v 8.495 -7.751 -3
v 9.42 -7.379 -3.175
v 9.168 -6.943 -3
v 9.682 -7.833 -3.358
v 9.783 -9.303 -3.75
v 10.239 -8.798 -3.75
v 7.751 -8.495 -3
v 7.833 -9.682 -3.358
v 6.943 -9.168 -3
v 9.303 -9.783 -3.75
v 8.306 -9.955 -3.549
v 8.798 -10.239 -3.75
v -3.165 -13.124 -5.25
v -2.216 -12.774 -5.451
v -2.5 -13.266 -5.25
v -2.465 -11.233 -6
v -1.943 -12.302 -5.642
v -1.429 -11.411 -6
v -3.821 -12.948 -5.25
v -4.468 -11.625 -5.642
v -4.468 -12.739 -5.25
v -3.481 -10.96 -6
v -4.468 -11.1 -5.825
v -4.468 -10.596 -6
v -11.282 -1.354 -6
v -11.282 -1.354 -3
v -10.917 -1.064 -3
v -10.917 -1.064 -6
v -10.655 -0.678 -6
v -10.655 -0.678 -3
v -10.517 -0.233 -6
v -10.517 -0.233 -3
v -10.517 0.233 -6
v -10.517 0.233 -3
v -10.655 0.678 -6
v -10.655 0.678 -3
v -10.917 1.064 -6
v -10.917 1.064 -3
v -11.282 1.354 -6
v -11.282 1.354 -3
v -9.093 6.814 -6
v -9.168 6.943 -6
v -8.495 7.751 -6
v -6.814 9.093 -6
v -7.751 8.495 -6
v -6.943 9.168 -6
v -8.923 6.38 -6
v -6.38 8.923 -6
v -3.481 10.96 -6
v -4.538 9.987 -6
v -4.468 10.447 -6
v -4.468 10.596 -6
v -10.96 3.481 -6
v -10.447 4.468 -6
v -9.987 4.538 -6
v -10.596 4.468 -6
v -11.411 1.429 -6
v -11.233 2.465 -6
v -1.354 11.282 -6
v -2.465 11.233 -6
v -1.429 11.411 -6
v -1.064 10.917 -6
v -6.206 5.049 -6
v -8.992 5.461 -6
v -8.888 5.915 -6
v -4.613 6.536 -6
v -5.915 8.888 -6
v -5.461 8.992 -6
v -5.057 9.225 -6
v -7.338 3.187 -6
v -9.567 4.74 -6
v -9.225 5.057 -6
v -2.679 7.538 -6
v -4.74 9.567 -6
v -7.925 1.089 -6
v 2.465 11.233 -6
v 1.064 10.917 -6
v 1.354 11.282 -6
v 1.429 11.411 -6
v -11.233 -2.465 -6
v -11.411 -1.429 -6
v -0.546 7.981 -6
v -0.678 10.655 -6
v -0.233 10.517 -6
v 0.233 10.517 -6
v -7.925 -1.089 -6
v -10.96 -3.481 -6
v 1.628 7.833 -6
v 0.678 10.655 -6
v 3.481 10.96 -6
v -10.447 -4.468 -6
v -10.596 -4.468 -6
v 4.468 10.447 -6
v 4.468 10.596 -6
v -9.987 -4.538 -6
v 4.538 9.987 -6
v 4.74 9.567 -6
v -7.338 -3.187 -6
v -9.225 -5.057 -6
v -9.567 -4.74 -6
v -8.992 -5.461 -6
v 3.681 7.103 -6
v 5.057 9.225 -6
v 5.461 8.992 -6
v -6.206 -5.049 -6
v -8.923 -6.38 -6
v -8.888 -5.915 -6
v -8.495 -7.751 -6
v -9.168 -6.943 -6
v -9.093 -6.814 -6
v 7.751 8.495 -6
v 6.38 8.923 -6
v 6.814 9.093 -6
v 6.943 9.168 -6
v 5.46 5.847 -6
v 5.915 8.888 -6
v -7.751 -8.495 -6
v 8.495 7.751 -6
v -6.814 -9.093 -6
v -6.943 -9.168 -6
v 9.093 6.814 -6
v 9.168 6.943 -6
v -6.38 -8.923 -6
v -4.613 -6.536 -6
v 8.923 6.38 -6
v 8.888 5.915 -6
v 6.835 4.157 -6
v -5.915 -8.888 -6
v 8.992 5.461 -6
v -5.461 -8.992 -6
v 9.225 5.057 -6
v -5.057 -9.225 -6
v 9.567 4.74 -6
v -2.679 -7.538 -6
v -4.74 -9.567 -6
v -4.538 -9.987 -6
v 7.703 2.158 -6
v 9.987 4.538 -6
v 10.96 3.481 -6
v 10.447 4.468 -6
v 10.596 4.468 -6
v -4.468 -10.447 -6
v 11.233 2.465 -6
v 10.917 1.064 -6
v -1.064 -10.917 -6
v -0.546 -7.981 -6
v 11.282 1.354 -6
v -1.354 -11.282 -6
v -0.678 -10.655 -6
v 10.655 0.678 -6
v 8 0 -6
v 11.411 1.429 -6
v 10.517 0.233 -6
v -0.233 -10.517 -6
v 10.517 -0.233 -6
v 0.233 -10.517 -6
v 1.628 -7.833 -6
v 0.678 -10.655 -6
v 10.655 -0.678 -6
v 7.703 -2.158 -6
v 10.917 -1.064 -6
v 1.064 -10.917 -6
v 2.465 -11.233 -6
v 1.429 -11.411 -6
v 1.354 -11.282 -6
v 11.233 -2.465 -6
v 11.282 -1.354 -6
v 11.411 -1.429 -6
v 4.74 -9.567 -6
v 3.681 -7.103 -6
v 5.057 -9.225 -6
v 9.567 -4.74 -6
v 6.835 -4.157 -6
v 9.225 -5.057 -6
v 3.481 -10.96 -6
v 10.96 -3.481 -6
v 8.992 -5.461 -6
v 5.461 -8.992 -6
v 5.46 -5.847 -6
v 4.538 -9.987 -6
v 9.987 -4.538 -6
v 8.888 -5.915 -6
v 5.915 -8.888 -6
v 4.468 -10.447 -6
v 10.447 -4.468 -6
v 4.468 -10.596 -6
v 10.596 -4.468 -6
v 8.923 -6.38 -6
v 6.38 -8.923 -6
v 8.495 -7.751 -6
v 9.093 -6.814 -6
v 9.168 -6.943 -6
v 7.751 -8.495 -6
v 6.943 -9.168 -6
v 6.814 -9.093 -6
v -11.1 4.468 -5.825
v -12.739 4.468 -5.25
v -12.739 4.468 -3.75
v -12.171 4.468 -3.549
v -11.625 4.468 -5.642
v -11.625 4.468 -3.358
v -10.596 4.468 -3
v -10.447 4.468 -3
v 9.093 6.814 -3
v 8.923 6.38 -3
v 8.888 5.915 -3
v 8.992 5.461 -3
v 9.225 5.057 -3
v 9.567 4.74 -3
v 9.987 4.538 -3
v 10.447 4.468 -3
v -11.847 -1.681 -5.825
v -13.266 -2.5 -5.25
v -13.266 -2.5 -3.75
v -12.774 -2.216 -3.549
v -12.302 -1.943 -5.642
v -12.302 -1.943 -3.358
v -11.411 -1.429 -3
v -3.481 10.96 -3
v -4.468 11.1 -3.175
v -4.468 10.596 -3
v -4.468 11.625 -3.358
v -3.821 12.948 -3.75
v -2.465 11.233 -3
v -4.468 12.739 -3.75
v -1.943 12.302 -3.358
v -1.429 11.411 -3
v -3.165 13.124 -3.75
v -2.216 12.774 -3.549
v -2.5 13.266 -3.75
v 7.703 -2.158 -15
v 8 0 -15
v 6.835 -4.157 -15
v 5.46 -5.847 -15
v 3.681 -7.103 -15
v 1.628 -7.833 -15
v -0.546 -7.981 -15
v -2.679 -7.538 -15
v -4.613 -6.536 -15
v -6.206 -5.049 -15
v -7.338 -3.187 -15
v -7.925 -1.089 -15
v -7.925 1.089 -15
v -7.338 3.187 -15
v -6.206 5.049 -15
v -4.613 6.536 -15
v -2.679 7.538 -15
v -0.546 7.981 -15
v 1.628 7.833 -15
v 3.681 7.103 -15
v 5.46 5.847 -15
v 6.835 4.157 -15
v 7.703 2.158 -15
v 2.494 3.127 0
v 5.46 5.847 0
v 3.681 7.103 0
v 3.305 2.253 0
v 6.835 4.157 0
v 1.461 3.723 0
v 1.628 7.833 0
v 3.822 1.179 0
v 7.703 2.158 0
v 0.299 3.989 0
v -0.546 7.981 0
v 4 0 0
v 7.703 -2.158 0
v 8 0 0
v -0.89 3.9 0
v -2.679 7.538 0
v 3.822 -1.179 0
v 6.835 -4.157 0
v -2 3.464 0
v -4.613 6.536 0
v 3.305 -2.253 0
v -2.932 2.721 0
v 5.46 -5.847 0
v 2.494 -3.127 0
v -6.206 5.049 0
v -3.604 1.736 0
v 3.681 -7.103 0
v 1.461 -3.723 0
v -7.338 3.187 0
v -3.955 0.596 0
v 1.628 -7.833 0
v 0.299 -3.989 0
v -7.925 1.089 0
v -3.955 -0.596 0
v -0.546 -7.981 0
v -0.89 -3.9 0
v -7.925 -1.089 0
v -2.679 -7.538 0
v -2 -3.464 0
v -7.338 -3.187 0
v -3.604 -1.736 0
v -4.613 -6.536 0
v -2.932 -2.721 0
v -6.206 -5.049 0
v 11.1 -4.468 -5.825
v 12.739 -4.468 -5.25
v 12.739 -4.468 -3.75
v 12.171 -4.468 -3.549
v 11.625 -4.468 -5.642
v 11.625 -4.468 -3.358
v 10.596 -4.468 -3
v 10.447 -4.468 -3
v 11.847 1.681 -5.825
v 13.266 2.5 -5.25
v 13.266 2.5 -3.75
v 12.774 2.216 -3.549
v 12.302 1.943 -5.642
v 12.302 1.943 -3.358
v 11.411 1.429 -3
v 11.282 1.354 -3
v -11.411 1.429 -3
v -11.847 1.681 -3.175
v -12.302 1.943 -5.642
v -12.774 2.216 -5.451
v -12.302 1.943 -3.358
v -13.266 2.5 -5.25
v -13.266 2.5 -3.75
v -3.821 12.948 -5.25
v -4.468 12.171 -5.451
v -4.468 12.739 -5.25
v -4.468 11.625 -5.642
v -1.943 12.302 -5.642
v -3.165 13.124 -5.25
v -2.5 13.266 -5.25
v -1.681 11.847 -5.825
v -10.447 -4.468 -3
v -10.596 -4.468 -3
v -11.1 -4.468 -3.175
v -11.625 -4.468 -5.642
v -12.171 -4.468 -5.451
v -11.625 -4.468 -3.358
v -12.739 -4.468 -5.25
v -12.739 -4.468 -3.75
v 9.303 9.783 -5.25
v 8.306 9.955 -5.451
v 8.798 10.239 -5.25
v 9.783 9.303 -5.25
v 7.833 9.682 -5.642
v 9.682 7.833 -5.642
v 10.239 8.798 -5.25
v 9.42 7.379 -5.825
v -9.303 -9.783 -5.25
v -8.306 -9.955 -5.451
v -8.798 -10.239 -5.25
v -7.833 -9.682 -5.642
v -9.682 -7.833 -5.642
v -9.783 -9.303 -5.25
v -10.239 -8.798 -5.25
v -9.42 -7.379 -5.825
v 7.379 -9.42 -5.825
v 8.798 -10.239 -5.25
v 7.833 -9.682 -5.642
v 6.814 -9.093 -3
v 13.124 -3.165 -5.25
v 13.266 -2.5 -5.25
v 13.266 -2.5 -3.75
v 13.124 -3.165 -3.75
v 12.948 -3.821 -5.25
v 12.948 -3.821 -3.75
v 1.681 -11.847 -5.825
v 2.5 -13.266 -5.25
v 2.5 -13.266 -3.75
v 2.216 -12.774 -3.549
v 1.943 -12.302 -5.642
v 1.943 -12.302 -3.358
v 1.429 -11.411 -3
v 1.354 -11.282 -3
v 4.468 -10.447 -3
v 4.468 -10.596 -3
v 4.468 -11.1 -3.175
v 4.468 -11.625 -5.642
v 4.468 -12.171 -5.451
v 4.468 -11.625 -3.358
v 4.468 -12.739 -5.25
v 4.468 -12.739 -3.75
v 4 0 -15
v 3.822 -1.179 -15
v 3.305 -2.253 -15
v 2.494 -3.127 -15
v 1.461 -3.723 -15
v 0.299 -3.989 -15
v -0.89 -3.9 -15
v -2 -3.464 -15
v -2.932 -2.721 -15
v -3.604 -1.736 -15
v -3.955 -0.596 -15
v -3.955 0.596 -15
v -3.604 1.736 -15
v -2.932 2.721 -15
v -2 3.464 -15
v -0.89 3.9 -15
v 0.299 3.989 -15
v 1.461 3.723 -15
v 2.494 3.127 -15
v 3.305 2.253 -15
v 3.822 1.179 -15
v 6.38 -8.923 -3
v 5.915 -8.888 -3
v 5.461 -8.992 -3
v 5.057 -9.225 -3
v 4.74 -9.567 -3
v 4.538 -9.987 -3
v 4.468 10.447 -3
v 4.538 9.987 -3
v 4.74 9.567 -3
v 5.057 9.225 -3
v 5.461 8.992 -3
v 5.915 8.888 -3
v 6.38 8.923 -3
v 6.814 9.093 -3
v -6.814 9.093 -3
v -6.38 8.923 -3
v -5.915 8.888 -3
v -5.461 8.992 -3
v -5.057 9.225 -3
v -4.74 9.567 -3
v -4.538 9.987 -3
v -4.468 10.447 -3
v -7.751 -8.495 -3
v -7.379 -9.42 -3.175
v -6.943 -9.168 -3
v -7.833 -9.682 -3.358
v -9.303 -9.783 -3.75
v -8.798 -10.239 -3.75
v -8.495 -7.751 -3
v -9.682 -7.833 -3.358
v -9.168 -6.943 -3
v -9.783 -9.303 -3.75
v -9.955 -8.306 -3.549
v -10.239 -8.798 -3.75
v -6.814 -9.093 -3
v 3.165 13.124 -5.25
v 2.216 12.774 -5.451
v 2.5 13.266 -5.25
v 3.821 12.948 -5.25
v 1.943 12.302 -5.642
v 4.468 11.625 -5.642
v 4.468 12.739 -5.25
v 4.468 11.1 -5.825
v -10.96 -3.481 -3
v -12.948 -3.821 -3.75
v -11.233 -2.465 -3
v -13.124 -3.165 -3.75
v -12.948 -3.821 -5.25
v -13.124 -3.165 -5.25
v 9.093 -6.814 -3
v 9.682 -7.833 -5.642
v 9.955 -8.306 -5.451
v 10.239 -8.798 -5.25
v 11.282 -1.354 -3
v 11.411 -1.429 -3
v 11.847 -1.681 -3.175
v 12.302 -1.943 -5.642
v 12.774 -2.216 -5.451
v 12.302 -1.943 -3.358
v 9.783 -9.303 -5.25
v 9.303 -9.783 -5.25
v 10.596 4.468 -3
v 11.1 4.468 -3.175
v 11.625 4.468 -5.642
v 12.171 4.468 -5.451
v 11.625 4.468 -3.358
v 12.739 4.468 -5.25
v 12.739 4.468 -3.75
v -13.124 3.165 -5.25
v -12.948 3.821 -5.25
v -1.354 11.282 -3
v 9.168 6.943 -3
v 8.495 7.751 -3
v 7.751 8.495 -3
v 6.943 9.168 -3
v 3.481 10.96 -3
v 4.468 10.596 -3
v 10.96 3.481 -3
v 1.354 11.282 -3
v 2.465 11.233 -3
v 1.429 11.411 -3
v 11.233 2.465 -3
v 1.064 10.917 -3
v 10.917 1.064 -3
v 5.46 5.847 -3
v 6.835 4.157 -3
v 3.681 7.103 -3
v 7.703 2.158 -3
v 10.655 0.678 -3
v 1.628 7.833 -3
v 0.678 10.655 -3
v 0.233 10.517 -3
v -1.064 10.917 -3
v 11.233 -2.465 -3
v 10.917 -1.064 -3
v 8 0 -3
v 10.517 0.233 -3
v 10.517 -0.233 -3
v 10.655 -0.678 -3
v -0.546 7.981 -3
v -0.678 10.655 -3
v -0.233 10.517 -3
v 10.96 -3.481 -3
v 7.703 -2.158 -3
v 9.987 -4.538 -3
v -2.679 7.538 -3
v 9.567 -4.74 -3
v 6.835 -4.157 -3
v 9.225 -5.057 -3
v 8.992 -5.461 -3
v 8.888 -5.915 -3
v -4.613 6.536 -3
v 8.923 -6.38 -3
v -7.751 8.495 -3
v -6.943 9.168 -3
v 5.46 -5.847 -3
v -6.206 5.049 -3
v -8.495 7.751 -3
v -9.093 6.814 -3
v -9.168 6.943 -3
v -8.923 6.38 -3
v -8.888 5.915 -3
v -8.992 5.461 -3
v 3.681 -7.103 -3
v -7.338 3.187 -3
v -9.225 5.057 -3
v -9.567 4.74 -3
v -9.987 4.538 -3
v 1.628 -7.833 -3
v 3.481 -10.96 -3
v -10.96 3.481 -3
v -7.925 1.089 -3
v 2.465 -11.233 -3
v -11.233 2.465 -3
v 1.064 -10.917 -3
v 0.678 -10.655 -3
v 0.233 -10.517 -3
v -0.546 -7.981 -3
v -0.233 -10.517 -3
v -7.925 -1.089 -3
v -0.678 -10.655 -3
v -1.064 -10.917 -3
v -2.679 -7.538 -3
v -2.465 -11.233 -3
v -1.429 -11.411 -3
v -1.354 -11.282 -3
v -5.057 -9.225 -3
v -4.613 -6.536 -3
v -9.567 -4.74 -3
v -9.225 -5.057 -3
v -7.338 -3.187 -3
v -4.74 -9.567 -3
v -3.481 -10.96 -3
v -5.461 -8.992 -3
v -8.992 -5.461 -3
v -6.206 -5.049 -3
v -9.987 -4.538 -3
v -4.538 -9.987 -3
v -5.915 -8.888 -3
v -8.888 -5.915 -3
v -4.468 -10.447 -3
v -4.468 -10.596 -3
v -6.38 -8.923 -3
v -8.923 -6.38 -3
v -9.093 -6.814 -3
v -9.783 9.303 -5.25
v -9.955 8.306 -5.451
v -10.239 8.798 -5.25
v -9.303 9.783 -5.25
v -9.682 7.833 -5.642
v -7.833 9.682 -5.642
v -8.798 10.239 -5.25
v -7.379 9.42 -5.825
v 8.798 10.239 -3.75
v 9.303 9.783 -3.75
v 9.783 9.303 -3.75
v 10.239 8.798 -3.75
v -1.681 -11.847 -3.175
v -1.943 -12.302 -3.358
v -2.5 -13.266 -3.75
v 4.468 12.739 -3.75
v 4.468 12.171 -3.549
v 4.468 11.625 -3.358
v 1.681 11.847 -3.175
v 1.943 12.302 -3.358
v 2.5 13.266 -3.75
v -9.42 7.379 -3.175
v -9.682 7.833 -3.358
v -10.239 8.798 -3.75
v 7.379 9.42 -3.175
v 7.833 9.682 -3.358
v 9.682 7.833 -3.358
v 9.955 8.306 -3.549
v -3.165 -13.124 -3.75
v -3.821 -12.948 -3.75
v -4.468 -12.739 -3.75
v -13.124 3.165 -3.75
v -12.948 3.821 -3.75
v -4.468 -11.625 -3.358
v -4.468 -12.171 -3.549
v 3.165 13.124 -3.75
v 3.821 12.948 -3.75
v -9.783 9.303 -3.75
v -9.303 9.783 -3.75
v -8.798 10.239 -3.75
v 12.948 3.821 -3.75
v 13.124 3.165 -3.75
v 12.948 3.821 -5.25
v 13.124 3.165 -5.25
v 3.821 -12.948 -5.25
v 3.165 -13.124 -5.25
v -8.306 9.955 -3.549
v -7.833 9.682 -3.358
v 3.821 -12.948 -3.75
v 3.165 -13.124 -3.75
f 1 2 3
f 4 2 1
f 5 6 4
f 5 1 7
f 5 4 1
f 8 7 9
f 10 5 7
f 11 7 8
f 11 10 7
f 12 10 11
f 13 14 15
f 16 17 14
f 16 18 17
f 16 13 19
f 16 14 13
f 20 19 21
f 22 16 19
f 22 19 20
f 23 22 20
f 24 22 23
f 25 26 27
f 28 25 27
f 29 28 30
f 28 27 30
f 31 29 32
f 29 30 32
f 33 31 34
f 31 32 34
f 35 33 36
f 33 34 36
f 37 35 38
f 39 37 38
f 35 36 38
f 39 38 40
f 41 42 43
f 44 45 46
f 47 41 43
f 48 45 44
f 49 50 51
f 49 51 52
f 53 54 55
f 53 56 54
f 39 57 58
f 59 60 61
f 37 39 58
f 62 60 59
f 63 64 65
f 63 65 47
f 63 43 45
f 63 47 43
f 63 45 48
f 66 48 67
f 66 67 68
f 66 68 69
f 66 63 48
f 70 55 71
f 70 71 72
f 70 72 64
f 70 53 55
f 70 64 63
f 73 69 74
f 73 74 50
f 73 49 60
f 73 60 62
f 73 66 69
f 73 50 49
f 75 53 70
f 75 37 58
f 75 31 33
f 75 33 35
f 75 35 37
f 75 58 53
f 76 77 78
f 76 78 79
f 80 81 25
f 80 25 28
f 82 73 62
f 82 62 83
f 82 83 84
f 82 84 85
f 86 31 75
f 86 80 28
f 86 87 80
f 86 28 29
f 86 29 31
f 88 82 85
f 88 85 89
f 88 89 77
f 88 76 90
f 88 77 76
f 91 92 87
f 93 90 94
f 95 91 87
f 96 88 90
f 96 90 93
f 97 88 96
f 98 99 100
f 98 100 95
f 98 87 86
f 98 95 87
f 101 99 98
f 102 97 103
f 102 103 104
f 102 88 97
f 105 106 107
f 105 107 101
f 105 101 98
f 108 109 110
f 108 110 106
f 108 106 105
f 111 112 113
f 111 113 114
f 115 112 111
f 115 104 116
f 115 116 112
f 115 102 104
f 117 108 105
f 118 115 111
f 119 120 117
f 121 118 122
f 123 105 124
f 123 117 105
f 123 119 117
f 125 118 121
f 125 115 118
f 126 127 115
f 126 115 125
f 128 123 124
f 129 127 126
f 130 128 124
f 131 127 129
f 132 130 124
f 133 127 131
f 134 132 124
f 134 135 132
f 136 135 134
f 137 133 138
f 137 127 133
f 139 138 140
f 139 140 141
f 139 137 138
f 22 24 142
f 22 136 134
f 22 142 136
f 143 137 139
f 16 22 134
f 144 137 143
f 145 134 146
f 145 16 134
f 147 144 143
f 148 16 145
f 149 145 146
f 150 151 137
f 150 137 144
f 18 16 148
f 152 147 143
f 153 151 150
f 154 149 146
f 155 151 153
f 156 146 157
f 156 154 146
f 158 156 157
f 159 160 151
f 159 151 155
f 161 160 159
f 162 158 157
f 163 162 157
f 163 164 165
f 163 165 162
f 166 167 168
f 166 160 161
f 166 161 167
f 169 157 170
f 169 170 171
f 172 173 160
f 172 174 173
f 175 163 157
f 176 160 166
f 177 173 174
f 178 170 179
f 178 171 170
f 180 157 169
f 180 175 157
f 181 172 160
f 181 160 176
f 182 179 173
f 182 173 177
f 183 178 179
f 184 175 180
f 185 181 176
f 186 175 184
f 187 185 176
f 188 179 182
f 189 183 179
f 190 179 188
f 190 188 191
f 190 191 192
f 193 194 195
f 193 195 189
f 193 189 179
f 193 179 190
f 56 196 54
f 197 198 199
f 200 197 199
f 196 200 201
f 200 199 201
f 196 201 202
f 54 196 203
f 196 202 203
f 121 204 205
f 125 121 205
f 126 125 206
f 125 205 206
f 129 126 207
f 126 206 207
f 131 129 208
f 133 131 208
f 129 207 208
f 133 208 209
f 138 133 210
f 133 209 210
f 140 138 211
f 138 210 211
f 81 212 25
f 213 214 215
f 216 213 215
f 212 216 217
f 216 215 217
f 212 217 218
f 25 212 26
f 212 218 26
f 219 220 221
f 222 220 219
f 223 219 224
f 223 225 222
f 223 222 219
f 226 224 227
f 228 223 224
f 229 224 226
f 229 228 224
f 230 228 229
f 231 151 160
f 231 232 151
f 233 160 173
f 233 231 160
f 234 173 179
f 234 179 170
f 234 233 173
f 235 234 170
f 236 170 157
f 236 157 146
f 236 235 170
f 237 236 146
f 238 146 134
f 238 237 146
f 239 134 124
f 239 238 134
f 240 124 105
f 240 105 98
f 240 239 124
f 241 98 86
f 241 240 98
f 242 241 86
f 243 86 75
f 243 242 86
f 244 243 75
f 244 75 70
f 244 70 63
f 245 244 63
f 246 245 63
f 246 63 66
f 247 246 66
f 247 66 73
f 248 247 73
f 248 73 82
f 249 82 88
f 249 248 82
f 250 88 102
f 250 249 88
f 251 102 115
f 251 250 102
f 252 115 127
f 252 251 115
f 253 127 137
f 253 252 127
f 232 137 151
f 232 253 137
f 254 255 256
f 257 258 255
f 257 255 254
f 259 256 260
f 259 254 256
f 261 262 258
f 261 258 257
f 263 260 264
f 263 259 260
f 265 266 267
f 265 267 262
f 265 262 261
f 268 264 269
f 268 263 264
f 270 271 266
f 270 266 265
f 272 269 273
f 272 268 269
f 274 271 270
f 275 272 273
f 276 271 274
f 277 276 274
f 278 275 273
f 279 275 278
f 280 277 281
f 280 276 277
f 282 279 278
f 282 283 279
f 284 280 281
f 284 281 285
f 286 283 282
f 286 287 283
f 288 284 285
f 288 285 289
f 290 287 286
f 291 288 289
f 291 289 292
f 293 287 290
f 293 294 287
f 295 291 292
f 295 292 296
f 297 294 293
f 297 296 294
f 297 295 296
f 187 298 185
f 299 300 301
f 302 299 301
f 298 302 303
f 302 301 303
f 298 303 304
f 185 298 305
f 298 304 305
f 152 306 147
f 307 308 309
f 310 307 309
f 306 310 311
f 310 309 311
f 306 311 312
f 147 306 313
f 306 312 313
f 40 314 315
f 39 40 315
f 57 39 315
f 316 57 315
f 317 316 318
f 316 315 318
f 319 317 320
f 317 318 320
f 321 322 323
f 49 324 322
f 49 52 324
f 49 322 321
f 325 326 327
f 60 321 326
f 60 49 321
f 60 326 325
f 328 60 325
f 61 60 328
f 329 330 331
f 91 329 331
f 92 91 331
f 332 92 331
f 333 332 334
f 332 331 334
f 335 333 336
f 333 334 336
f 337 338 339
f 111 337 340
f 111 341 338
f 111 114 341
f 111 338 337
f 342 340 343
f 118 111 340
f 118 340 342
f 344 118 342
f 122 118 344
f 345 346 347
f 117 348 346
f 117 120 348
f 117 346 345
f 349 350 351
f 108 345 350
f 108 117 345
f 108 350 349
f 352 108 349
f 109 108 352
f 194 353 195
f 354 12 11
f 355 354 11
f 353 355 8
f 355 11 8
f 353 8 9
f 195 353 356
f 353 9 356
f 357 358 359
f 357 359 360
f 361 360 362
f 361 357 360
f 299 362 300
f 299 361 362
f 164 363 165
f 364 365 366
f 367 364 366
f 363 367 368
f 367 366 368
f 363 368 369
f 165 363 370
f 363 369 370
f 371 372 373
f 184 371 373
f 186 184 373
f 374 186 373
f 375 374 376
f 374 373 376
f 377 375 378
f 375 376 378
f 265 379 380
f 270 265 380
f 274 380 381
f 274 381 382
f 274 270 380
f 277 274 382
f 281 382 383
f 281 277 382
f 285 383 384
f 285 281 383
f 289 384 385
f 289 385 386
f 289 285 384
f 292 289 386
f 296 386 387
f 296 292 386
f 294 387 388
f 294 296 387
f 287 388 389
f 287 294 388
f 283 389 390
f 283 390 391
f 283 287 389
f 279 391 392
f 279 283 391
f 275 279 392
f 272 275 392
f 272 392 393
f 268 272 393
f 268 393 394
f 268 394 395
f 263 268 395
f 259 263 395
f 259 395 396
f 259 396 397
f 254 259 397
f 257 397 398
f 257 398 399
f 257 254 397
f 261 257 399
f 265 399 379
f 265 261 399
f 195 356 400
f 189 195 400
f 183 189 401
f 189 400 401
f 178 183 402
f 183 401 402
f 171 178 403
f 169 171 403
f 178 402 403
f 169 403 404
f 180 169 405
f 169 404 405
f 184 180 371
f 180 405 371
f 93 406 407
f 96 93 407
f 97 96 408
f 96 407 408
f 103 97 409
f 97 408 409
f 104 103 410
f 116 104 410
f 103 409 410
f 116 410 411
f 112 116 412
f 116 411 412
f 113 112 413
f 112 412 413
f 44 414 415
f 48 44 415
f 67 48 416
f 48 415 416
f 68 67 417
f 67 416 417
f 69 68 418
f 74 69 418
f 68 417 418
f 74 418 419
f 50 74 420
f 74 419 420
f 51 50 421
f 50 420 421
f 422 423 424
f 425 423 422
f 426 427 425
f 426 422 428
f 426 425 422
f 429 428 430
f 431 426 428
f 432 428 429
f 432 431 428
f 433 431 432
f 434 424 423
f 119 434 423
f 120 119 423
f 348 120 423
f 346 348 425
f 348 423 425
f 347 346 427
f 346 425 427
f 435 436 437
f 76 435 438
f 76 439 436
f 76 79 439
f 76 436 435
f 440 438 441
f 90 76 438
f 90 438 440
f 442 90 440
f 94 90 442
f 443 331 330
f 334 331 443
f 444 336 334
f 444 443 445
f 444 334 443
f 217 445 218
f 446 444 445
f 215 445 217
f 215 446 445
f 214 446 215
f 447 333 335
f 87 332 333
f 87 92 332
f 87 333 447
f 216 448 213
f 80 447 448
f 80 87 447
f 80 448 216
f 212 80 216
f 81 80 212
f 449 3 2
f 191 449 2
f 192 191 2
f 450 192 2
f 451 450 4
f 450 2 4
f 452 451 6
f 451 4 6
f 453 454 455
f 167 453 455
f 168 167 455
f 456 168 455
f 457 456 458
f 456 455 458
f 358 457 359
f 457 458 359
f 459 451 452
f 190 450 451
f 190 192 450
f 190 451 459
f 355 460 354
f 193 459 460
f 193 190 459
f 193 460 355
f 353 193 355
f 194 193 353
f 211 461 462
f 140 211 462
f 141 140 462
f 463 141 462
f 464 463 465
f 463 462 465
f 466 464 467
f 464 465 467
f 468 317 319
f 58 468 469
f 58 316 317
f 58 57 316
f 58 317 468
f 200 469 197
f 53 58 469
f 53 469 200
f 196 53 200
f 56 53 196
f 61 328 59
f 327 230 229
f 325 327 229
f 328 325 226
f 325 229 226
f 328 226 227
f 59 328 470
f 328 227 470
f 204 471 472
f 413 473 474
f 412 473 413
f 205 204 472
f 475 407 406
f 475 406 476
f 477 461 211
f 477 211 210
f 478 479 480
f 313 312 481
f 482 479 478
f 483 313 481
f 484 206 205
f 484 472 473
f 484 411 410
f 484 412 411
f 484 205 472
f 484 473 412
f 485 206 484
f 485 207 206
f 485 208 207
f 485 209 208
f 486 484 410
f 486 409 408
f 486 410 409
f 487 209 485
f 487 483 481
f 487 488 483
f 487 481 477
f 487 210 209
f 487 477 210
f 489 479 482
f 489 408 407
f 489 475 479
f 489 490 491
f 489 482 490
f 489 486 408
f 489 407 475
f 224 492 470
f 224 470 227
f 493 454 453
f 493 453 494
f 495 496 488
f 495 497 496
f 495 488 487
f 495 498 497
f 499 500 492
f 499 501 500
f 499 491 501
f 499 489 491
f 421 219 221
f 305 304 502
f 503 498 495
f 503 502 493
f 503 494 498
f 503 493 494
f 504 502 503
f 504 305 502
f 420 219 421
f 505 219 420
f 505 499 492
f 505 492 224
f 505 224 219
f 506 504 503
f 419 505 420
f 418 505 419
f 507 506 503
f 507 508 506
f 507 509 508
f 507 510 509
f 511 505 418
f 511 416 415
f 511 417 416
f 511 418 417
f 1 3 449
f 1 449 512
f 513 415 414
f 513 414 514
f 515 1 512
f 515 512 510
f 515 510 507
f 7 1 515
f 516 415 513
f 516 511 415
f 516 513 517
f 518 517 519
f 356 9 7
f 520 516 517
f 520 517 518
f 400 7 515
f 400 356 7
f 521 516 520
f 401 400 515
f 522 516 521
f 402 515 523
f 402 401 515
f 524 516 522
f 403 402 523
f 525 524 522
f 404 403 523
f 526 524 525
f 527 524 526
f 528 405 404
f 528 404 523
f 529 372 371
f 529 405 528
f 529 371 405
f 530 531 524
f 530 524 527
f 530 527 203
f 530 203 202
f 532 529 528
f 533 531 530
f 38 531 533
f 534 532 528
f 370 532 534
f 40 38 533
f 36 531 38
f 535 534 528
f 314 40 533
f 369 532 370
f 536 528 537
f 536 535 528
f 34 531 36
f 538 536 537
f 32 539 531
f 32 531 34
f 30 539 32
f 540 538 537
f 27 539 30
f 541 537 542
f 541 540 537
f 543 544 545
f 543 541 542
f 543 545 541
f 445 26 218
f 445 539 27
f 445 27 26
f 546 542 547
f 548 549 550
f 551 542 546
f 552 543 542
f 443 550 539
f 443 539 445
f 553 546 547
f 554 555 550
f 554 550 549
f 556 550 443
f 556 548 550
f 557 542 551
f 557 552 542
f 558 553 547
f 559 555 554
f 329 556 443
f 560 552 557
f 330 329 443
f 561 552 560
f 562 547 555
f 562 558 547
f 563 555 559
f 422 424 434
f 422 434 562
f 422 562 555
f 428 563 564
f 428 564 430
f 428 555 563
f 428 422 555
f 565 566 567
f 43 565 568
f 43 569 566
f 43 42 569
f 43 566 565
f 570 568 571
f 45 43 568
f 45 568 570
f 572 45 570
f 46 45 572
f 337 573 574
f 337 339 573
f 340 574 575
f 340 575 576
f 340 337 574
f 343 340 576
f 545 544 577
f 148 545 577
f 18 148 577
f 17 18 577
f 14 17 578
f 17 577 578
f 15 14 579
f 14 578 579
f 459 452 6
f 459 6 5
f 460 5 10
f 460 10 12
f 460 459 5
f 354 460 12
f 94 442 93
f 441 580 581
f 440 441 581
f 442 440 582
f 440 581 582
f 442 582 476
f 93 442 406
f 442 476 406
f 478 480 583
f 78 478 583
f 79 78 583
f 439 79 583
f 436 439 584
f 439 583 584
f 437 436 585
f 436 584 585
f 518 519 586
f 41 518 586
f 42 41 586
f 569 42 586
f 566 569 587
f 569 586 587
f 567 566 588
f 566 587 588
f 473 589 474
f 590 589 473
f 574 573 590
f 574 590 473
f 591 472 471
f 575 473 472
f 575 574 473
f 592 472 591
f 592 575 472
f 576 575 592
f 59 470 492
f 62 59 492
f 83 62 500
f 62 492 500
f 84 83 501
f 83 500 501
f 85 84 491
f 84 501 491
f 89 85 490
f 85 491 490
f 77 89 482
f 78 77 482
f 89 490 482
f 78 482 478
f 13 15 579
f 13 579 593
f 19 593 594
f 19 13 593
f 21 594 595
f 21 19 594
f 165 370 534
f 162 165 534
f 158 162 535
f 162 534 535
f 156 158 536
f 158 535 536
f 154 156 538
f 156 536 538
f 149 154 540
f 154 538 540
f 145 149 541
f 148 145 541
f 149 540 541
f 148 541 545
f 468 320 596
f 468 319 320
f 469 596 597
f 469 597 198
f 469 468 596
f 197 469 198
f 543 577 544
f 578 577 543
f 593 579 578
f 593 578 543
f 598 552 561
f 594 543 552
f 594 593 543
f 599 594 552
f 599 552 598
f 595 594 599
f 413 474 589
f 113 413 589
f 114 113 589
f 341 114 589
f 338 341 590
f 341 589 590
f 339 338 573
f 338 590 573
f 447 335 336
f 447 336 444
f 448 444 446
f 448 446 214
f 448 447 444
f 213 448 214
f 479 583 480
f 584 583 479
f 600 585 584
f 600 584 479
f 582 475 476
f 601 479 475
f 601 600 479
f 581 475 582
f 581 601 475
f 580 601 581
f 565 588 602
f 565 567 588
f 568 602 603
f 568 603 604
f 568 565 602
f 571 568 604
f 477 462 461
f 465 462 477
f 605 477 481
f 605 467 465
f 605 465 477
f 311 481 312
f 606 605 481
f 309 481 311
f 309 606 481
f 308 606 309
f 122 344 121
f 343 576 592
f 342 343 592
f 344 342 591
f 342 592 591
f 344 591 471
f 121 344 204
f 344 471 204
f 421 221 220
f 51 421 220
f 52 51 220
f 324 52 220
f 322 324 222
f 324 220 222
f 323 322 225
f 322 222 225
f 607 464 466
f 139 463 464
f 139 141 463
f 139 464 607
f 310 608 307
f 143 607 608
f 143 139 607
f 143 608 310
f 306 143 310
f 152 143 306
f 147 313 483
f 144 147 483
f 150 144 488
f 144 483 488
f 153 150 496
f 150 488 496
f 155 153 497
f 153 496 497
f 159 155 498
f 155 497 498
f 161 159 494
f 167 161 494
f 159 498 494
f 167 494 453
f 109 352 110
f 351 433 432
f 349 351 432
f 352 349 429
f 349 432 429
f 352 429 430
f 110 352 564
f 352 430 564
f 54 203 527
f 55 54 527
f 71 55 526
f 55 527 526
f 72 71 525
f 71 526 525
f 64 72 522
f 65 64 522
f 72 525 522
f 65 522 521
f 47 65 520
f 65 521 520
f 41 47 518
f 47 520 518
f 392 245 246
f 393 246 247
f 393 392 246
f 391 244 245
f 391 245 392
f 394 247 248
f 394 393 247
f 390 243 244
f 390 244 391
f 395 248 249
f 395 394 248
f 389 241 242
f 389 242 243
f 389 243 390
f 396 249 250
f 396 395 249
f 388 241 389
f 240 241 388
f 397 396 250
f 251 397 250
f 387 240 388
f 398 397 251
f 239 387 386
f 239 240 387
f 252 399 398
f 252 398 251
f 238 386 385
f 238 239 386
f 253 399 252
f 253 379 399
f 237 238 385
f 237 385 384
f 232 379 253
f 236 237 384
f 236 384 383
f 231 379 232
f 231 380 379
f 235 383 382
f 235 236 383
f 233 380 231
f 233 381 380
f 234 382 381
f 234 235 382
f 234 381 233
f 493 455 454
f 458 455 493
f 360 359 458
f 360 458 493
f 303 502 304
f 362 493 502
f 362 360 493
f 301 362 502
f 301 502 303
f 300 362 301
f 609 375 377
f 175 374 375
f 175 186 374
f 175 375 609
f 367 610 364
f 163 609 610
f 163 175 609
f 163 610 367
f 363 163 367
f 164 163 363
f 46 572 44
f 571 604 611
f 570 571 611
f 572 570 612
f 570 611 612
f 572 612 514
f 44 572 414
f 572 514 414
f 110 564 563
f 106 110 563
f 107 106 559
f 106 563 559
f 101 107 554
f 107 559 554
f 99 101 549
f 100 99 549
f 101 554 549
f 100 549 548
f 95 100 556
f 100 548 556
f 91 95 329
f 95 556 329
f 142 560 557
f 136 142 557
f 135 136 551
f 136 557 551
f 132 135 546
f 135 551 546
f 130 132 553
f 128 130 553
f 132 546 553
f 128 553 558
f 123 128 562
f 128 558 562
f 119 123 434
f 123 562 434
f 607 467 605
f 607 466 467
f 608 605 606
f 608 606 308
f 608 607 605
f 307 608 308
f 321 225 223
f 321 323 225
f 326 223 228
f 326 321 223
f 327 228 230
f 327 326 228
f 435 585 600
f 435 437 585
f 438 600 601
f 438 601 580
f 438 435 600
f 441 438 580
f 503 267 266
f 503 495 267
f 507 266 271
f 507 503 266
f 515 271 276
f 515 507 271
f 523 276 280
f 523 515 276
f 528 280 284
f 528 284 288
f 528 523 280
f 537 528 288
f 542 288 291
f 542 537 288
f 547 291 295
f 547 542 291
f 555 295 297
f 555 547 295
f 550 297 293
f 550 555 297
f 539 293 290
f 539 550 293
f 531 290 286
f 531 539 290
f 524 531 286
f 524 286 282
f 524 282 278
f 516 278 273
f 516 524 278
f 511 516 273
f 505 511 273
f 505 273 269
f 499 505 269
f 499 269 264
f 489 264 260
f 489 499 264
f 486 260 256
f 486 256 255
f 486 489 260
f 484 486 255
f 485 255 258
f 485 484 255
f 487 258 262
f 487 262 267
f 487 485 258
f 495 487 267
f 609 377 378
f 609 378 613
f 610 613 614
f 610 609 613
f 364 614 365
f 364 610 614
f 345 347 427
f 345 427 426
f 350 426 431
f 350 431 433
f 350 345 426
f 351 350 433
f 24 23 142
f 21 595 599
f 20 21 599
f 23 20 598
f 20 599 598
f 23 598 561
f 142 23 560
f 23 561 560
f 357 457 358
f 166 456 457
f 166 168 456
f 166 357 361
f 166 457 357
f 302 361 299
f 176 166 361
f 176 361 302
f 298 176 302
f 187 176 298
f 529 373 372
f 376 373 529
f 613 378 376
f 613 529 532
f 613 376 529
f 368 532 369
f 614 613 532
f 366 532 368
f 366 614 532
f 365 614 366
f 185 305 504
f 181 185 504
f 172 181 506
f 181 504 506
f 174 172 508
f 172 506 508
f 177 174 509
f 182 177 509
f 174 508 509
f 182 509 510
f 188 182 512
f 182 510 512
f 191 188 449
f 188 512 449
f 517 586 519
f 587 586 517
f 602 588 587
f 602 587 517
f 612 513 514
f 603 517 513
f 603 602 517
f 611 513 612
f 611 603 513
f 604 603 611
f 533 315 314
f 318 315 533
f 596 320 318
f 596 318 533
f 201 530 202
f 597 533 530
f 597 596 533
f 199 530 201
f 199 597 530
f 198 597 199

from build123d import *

# Parameters (mm, degrees)
CUT_EXTRUDE1_DEPTH = 23.549944568


with BuildPart() as part:
    # Sketch1 → Revolve1 (revolve)
    with BuildSketch(Plane(origin=(0, 0, 0), x_dir=(1, 0, 0), z_dir=(0, 1, 0)), mode=Mode.PRIVATE) as revolve1_sk:
        Polygon((-4, 0), (-8, 0), (-8, 3), (-11.5, 3), (-13.5, 3.75), (-13.5, 5.25), (-11.5, 6), (-8, 6), (-8, 15), (-4, 15), align=None)
    revolve(revolve1_sk.sketch.rotate(Axis((0, 0, 0), (0, 0, -1)), 180), axis=Axis((0, 0, 0), (0, 0, -1)))

    # Sketch2 → Cut-Extrude1 (cut, through all)
    with BuildSketch(Plane.XY.offset(-3)):
        with BuildLine():
            Line((-2.5, 13.266499161), (-1.354141447, 11.281813929))
            ThreePointArc((-1.354141447, 11.281813929), (0, 10.5), (1.354141447, 11.281813929))
            Line((1.354141447, 11.281813929), (2.5, 13.266499161))
            ThreePointArc((2.5, 13.266499161), (0, 13.5), (-2.5, 13.266499161))
        make_face()
        with BuildLine():
            Line((4.468186071, 12.739125293), (4.468186071, 10.447408186))
            ThreePointArc((4.468186071, 10.447408186), (5.25, 9.09326674), (6.813627858, 9.09326674))
            Line((6.813627858, 9.09326674), (8.79831309, 10.239125293))
            ThreePointArc((8.79831309, 10.239125293), (6.75, 11.691342951), (4.468186071, 12.739125293))
        make_face()
        with BuildLine():
            Line((10.239125293, 8.79831309), (9.09326674, 6.813627858))
            ThreePointArc((9.09326674, 6.813627858), (9.09326674, 5.25), (10.447408186, 4.468186071))
            Line((10.447408186, 4.468186071), (12.739125293, 4.468186071))
            ThreePointArc((12.739125293, 4.468186071), (11.691342951, 6.75), (10.239125293, 8.79831309))
        make_face()
        with BuildLine():
            Line((13.266499161, 2.5), (11.281813929, 1.354141447))
            ThreePointArc((11.281813929, 1.354141447), (10.5, 0), (11.281813929, -1.354141447))
            Line((11.281813929, -1.354141447), (13.266499161, -2.5))
            ThreePointArc((13.266499161, -2.5), (13.5, 0), (13.266499161, 2.5))
        make_face()
        with BuildLine():
            Line((12.739125293, -4.468186071), (10.447408186, -4.468186071))
            ThreePointArc((10.447408186, -4.468186071), (9.09326674, -5.25), (9.09326674, -6.813627858))
            Line((9.09326674, -6.813627858), (10.239125293, -8.79831309))
            ThreePointArc((10.239125293, -8.79831309), (11.691342951, -6.75), (12.739125293, -4.468186071))
        make_face()
        with BuildLine():
            Line((8.79831309, -10.239125293), (6.813627858, -9.09326674))
            ThreePointArc((6.813627858, -9.09326674), (5.25, -9.09326674), (4.468186071, -10.447408186))
            Line((4.468186071, -10.447408186), (4.468186071, -12.739125293))
            ThreePointArc((4.468186071, -12.739125293), (6.75, -11.691342951), (8.79831309, -10.239125293))
        make_face()
        with BuildLine():
            Line((2.5, -13.266499161), (1.354141447, -11.281813929))
            ThreePointArc((1.354141447, -11.281813929), (0, -10.5), (-1.354141447, -11.281813929))
            Line((-1.354141447, -11.281813929), (-2.5, -13.266499161))
            ThreePointArc((-2.5, -13.266499161), (0, -13.5), (2.5, -13.266499161))
        make_face()
        with BuildLine():
            Line((-4.468186071, -12.739125293), (-4.468186071, -10.447408186))
            ThreePointArc((-4.468186071, -10.447408186), (-5.25, -9.09326674), (-6.813627858, -9.09326674))
            Line((-6.813627858, -9.09326674), (-8.79831309, -10.239125293))
            ThreePointArc((-8.79831309, -10.239125293), (-6.75, -11.691342951), (-4.468186071, -12.739125293))
        make_face()
        with BuildLine():
            Line((-10.239125293, -8.79831309), (-9.09326674, -6.813627858))
            ThreePointArc((-9.09326674, -6.813627858), (-9.09326674, -5.25), (-10.447408186, -4.468186071))
            Line((-10.447408186, -4.468186071), (-12.739125293, -4.468186071))
            ThreePointArc((-12.739125293, -4.468186071), (-11.691342951, -6.75), (-10.239125293, -8.79831309))
        make_face()
        with BuildLine():
            Line((-13.266499161, -2.5), (-11.281813929, -1.354141447))
            ThreePointArc((-11.281813929, -1.354141447), (-10.5, 0), (-11.281813929, 1.354141447))
            Line((-11.281813929, 1.354141447), (-13.266499161, 2.5))
            ThreePointArc((-13.266499161, 2.5), (-13.5, 0), (-13.266499161, -2.5))
        make_face()
        with BuildLine():
            Line((-12.739125293, 4.468186071), (-10.447408186, 4.468186071))
            ThreePointArc((-10.447408186, 4.468186071), (-9.09326674, 5.25), (-9.09326674, 6.813627858))
            Line((-9.09326674, 6.813627858), (-10.239125293, 8.79831309))
            ThreePointArc((-10.239125293, 8.79831309), (-11.691342951, 6.75), (-12.739125293, 4.468186071))
        make_face()
        with BuildLine():
            Line((-8.79831309, 10.239125293), (-6.813627858, 9.09326674))
            ThreePointArc((-6.813627858, 9.09326674), (-5.25, 9.09326674), (-4.468186071, 10.447408186))
            Line((-4.468186071, 10.447408186), (-4.468186071, 12.739125293))
            ThreePointArc((-4.468186071, 12.739125293), (-6.75, 11.691342951), (-8.79831309, 10.239125293))
        make_face()
    extrude(amount=-CUT_EXTRUDE1_DEPTH, mode=Mode.SUBTRACT)


solid = part.part
